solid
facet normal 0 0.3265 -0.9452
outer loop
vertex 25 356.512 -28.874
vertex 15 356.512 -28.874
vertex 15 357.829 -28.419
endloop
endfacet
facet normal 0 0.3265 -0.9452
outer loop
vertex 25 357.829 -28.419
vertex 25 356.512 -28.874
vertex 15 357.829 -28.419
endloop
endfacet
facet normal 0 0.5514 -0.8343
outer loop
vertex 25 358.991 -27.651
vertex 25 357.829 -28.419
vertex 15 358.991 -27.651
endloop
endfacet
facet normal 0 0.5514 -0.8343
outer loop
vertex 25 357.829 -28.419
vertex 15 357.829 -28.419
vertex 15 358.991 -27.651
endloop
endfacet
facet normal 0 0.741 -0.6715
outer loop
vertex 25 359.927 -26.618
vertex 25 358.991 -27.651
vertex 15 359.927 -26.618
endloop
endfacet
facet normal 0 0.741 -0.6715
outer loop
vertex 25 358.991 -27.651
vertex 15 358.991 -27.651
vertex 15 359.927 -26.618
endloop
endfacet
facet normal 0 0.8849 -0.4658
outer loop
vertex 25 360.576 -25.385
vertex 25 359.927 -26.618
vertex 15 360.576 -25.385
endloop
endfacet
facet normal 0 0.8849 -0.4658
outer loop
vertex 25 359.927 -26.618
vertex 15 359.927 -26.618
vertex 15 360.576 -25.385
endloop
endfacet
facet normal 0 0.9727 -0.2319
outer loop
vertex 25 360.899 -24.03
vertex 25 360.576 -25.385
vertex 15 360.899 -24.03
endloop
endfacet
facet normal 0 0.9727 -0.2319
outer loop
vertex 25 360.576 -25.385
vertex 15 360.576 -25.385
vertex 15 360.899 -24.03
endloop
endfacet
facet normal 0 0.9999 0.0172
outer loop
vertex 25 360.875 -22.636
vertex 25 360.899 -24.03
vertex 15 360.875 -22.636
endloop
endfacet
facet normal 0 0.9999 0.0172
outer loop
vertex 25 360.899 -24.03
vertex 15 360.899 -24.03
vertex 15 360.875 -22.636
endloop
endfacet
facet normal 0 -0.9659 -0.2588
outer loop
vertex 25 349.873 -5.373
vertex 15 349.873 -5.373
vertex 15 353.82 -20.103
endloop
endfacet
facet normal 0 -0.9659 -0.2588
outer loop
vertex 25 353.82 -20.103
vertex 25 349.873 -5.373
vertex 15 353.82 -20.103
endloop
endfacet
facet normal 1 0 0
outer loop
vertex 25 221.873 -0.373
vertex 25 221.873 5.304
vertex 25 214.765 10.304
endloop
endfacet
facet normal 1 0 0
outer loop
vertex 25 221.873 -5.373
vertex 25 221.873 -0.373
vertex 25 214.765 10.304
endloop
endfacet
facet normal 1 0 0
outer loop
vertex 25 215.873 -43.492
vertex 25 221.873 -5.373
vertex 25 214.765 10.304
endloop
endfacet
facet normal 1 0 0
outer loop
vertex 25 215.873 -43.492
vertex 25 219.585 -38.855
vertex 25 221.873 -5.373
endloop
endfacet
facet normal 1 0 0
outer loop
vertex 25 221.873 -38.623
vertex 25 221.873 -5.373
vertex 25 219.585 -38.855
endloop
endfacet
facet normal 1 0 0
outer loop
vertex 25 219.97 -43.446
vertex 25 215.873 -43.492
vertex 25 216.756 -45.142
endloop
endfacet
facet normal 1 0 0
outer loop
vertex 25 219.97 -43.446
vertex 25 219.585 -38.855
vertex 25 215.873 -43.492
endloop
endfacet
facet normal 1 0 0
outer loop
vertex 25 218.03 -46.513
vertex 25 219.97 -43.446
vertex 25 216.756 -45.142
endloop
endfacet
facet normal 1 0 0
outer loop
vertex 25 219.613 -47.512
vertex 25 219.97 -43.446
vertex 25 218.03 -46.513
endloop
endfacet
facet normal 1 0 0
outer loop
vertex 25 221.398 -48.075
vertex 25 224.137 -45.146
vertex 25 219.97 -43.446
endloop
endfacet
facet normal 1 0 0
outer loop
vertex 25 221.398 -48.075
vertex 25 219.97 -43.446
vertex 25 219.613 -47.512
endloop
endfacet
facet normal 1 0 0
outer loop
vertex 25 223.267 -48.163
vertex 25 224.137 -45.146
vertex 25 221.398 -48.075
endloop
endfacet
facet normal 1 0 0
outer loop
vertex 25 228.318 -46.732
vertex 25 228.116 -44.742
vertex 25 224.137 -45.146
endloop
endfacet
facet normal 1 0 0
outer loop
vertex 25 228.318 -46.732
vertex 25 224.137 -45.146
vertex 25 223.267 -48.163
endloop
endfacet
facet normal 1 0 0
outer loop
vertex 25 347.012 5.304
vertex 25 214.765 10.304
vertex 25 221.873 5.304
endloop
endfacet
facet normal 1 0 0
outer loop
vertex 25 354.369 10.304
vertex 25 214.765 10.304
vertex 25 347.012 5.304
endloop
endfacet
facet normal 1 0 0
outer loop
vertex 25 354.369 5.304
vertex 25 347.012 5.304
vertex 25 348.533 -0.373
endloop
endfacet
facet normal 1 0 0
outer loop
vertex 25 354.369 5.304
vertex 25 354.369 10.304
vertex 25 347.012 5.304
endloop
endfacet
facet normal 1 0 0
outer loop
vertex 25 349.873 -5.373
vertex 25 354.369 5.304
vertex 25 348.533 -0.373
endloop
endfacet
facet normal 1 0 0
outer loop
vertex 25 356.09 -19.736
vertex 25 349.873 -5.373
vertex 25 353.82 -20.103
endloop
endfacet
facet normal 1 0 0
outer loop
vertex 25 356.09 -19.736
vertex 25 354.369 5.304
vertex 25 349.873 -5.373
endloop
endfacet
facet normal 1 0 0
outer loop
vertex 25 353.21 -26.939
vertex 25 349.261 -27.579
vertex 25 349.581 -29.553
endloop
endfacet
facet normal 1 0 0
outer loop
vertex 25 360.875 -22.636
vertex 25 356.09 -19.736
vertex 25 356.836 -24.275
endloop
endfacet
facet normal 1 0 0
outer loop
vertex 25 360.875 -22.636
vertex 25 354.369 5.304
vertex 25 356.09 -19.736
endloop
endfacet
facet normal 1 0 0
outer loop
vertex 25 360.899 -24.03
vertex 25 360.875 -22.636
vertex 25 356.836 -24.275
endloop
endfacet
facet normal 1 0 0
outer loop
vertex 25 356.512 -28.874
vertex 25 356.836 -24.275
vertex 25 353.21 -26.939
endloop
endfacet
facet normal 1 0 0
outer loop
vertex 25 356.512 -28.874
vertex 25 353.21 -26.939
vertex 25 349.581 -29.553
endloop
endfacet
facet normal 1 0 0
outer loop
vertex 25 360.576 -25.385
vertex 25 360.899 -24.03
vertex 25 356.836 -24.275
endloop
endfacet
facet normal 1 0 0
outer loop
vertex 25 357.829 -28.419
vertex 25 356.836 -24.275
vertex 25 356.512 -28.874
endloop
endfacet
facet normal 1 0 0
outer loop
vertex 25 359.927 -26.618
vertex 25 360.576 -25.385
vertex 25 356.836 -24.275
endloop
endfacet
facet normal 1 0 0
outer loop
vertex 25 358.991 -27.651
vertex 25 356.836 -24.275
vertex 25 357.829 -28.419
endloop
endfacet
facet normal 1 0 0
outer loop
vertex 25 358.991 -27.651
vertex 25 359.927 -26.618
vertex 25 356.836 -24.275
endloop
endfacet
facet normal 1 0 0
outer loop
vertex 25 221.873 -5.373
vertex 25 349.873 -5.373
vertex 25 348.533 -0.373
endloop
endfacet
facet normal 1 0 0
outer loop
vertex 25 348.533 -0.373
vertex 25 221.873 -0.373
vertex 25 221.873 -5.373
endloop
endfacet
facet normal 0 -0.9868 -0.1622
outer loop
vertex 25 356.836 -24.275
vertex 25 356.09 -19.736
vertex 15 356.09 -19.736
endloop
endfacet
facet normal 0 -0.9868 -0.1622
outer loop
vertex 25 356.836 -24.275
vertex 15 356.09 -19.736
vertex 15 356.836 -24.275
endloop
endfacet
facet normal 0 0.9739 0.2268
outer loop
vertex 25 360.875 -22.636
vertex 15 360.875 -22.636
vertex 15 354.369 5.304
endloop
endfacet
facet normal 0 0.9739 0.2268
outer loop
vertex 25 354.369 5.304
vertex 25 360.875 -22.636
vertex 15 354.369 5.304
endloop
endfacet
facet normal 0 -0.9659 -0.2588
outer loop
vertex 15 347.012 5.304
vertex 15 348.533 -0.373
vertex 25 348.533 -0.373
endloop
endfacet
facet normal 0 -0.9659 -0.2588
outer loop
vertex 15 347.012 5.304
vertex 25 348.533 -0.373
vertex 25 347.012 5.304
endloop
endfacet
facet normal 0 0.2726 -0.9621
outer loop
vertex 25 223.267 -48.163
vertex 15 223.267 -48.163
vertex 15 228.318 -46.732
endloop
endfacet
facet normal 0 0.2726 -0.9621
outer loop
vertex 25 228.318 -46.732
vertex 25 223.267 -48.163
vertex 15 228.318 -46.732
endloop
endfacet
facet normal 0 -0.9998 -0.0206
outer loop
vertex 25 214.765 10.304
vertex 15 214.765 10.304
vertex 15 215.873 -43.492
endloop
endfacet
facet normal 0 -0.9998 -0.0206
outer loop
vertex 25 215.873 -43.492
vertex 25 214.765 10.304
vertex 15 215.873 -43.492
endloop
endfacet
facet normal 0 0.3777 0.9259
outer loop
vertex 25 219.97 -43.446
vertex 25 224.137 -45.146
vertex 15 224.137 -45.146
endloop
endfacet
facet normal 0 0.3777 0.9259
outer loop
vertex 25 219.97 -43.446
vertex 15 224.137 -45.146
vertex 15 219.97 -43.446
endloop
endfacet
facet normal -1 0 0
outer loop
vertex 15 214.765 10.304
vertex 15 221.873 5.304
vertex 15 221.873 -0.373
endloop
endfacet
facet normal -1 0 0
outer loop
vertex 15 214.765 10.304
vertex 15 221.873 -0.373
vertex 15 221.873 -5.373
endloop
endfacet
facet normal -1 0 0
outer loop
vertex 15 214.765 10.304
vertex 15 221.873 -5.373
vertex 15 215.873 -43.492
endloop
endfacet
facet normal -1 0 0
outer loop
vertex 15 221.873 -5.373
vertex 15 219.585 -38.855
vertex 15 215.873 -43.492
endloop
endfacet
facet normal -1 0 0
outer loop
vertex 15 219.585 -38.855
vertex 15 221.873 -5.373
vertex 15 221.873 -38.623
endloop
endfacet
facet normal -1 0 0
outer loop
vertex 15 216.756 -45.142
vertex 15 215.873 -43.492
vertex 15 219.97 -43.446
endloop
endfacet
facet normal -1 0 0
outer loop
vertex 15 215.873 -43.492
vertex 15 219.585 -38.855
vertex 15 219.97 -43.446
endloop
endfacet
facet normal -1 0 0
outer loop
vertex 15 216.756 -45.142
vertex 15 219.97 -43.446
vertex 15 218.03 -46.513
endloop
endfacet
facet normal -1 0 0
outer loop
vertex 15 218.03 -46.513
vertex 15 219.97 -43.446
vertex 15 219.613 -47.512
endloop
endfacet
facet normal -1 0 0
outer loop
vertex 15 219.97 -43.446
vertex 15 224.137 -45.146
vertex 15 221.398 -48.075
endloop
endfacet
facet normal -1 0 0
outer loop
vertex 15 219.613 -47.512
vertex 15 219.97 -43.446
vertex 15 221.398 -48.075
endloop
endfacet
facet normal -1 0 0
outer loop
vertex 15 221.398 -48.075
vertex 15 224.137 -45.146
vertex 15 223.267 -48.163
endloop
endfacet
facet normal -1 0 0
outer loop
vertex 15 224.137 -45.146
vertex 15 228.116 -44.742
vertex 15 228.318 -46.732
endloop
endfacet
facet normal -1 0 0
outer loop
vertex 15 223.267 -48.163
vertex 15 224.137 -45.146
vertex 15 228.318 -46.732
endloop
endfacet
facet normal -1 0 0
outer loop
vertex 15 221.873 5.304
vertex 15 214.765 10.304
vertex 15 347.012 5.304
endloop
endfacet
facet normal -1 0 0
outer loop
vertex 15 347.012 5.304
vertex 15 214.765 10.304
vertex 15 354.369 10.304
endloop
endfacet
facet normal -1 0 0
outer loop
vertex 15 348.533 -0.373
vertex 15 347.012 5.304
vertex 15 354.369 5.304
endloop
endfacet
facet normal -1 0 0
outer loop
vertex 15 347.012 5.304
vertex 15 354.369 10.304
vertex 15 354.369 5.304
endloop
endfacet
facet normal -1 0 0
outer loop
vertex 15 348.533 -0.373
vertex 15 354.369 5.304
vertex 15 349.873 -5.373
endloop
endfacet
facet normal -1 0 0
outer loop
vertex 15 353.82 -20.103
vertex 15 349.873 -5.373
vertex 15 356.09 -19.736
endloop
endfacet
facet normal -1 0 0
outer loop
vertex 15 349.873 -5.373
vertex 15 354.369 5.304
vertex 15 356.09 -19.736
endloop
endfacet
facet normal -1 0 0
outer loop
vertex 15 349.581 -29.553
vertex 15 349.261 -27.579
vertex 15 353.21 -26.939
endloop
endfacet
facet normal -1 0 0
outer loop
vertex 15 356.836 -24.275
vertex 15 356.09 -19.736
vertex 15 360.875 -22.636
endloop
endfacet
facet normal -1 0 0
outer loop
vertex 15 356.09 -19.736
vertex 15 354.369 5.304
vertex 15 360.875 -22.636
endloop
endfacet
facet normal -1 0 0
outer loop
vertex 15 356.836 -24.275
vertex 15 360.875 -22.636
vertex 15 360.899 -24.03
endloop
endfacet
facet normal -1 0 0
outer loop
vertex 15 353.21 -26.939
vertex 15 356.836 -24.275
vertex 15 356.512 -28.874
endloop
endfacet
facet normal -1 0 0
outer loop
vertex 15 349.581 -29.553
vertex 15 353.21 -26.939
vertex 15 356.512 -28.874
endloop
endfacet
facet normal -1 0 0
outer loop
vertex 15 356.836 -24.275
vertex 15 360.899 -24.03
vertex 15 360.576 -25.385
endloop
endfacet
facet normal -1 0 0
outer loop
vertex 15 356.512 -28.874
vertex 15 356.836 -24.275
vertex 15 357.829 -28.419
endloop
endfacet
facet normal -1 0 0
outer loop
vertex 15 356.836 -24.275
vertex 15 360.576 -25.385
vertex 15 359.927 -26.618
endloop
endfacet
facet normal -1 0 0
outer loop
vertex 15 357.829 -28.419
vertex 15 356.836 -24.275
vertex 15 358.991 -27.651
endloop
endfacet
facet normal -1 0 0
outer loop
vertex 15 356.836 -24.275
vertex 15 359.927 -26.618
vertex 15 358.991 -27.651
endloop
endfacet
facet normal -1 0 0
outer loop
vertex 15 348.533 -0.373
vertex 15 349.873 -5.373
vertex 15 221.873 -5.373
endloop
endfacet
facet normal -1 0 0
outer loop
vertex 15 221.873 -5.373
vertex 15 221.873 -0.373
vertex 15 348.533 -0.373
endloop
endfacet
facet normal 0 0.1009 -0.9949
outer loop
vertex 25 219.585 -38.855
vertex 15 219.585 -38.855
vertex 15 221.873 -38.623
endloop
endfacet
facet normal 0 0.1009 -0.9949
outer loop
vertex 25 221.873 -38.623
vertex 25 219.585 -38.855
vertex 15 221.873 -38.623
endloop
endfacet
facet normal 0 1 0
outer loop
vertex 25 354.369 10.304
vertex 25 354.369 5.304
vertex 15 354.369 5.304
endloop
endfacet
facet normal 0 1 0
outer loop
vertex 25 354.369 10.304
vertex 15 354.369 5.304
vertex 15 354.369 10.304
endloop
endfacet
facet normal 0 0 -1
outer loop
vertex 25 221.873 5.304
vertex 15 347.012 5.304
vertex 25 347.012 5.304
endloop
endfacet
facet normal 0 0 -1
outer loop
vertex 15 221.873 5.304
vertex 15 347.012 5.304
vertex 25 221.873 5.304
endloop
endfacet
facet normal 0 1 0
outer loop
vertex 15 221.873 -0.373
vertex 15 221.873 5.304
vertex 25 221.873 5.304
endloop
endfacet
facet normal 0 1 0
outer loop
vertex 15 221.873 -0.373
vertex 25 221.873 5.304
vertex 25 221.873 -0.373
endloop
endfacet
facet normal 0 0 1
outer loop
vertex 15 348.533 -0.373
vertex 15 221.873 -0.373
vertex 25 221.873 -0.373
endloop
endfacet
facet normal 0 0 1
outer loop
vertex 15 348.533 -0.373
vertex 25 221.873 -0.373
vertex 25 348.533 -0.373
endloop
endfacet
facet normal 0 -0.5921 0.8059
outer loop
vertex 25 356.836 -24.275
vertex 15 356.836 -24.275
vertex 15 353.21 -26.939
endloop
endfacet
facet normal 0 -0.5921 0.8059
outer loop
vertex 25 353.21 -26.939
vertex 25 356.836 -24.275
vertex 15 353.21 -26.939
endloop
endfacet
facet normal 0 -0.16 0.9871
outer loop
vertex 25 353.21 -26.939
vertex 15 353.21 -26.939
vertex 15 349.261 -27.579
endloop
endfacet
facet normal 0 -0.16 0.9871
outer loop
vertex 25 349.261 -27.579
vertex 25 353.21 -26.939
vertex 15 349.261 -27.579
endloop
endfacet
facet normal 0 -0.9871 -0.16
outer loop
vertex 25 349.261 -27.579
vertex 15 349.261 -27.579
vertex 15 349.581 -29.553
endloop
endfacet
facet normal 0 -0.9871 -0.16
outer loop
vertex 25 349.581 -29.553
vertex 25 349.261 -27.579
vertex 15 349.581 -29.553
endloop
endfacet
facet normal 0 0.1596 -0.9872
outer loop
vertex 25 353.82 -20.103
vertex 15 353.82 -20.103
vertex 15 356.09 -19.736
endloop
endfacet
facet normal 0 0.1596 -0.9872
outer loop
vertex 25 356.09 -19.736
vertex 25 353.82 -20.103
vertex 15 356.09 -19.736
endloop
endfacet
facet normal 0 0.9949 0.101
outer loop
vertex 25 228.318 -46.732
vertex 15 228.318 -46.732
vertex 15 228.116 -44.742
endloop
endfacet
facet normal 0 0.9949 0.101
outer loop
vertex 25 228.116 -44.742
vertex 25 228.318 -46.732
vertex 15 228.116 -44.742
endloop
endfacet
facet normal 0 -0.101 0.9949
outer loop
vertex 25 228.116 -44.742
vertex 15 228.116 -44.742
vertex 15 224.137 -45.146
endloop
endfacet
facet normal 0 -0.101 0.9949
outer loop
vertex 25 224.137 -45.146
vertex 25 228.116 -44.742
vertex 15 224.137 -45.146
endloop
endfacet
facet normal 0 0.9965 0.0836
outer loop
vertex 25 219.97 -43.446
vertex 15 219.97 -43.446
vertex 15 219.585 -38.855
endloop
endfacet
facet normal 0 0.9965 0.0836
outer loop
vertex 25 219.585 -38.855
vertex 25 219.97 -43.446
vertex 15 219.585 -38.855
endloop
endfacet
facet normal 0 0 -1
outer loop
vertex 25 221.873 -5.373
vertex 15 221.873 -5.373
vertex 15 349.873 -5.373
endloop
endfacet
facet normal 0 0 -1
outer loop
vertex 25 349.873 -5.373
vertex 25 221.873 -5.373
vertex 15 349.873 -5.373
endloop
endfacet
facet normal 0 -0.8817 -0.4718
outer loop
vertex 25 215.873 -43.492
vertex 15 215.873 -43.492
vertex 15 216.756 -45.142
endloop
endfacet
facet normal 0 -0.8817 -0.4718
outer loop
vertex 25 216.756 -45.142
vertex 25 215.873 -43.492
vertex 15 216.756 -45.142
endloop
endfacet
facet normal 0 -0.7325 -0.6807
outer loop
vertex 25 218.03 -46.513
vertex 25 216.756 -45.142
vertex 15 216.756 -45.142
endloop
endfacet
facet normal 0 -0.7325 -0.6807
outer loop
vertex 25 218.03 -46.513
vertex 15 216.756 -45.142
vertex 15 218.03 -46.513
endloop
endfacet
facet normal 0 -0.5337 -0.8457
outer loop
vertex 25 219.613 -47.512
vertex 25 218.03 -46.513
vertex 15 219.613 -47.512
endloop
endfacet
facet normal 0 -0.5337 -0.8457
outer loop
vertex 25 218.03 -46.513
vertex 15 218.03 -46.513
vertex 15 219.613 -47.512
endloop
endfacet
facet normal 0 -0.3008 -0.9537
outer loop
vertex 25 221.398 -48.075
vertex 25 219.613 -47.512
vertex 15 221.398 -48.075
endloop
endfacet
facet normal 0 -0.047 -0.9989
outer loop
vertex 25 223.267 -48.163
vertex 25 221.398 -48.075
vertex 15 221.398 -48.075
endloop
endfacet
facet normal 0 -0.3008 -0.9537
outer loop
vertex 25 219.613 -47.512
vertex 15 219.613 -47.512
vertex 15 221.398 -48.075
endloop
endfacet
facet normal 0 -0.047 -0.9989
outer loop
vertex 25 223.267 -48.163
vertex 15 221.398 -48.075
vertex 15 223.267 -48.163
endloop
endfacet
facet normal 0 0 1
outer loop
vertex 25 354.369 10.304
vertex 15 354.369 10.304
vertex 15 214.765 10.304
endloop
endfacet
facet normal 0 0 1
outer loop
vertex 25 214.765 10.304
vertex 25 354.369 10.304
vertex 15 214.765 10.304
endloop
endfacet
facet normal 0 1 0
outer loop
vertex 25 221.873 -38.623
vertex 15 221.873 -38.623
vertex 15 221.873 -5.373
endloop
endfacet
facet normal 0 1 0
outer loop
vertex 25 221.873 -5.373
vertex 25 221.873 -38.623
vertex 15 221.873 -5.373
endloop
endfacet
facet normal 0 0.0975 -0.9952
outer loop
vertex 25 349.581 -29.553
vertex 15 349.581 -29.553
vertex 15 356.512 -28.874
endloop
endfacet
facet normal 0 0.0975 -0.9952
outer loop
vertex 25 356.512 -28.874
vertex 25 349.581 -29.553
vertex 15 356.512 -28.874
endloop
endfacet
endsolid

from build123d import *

# Parameters (mm, degrees)
BOSS_EXTRUDE1_DEPTH = 10


# Read off the part's stored shape, not the designer's step: Imported1
with BuildPart() as part:
    # Sketch3 → Boss-Extrude1 (new body)
    with BuildSketch(Plane(origin=(14.999999665, 0, 0), x_dir=(0, 0, -1), z_dir=(1, 0, 0))):
        with BuildLine():
            Line((29.553098604, 349.581092596), (28.873996809, 356.511801481))
            ThreePointArc((28.873996809, 356.511801481), (26.617852211, 359.926750423), (22.636385635, 360.875427723))
            Line((22.636385635, 360.875427723), (-5.304185674, 354.369103909))
            Line((-5.304185674, 354.369103909), (-10.304185562, 354.369103909))
            Line((-10.304185562, 354.369103909), (-10.304185562, 214.764729142))
            Line((-10.304185562, 214.764729142), (43.492022902, 215.872973204))
            ThreePointArc((43.492022902, 215.872973204), (47.063645136, 218.78911025), (48.163164407, 223.266988993))
            Line((48.163164407, 223.266988993), (46.73166573, 228.318288922))
            Line((46.73166573, 228.318288922), (44.741906226, 228.116184473))
            Line((44.741906226, 228.116184473), (45.146130025, 224.136650562))
            Line((45.146130025, 224.136650562), (43.445847929, 219.970226288))
            Line((43.445847929, 219.970226288), (38.855373859, 219.58476305))
            Line((38.855373859, 219.58476305), (38.622945547, 221.872985363))
            Line((38.622945547, 221.872985363), (5.372944754, 221.872985363))
            Line((5.372944754, 221.872985363), (5.372944288, 349.872976542))
            Line((5.372944288, 349.872976542), (20.103313029, 353.819966316))
            Line((20.103313029, 353.819966316), (19.735585898, 356.090396643))
            Line((19.735585898, 356.090396643), (24.27472733, 356.836169958))
            Line((24.27472733, 356.836169958), (26.93930082, 353.209882975))
            Line((26.93930082, 353.209882975), (27.578826994, 349.261313677))
            Line((27.578826994, 349.261313677), (29.553098604, 349.581092596))
        make_face()
        Polygon((-5.304185562, 221.872985363), (0.372943822, 221.872985363), (0.372943822, 348.53323067), (-5.304185562, 347.01204868), align=None, mode=Mode.SUBTRACT)
    extrude(amount=BOSS_EXTRUDE1_DEPTH)


solid = part.part
